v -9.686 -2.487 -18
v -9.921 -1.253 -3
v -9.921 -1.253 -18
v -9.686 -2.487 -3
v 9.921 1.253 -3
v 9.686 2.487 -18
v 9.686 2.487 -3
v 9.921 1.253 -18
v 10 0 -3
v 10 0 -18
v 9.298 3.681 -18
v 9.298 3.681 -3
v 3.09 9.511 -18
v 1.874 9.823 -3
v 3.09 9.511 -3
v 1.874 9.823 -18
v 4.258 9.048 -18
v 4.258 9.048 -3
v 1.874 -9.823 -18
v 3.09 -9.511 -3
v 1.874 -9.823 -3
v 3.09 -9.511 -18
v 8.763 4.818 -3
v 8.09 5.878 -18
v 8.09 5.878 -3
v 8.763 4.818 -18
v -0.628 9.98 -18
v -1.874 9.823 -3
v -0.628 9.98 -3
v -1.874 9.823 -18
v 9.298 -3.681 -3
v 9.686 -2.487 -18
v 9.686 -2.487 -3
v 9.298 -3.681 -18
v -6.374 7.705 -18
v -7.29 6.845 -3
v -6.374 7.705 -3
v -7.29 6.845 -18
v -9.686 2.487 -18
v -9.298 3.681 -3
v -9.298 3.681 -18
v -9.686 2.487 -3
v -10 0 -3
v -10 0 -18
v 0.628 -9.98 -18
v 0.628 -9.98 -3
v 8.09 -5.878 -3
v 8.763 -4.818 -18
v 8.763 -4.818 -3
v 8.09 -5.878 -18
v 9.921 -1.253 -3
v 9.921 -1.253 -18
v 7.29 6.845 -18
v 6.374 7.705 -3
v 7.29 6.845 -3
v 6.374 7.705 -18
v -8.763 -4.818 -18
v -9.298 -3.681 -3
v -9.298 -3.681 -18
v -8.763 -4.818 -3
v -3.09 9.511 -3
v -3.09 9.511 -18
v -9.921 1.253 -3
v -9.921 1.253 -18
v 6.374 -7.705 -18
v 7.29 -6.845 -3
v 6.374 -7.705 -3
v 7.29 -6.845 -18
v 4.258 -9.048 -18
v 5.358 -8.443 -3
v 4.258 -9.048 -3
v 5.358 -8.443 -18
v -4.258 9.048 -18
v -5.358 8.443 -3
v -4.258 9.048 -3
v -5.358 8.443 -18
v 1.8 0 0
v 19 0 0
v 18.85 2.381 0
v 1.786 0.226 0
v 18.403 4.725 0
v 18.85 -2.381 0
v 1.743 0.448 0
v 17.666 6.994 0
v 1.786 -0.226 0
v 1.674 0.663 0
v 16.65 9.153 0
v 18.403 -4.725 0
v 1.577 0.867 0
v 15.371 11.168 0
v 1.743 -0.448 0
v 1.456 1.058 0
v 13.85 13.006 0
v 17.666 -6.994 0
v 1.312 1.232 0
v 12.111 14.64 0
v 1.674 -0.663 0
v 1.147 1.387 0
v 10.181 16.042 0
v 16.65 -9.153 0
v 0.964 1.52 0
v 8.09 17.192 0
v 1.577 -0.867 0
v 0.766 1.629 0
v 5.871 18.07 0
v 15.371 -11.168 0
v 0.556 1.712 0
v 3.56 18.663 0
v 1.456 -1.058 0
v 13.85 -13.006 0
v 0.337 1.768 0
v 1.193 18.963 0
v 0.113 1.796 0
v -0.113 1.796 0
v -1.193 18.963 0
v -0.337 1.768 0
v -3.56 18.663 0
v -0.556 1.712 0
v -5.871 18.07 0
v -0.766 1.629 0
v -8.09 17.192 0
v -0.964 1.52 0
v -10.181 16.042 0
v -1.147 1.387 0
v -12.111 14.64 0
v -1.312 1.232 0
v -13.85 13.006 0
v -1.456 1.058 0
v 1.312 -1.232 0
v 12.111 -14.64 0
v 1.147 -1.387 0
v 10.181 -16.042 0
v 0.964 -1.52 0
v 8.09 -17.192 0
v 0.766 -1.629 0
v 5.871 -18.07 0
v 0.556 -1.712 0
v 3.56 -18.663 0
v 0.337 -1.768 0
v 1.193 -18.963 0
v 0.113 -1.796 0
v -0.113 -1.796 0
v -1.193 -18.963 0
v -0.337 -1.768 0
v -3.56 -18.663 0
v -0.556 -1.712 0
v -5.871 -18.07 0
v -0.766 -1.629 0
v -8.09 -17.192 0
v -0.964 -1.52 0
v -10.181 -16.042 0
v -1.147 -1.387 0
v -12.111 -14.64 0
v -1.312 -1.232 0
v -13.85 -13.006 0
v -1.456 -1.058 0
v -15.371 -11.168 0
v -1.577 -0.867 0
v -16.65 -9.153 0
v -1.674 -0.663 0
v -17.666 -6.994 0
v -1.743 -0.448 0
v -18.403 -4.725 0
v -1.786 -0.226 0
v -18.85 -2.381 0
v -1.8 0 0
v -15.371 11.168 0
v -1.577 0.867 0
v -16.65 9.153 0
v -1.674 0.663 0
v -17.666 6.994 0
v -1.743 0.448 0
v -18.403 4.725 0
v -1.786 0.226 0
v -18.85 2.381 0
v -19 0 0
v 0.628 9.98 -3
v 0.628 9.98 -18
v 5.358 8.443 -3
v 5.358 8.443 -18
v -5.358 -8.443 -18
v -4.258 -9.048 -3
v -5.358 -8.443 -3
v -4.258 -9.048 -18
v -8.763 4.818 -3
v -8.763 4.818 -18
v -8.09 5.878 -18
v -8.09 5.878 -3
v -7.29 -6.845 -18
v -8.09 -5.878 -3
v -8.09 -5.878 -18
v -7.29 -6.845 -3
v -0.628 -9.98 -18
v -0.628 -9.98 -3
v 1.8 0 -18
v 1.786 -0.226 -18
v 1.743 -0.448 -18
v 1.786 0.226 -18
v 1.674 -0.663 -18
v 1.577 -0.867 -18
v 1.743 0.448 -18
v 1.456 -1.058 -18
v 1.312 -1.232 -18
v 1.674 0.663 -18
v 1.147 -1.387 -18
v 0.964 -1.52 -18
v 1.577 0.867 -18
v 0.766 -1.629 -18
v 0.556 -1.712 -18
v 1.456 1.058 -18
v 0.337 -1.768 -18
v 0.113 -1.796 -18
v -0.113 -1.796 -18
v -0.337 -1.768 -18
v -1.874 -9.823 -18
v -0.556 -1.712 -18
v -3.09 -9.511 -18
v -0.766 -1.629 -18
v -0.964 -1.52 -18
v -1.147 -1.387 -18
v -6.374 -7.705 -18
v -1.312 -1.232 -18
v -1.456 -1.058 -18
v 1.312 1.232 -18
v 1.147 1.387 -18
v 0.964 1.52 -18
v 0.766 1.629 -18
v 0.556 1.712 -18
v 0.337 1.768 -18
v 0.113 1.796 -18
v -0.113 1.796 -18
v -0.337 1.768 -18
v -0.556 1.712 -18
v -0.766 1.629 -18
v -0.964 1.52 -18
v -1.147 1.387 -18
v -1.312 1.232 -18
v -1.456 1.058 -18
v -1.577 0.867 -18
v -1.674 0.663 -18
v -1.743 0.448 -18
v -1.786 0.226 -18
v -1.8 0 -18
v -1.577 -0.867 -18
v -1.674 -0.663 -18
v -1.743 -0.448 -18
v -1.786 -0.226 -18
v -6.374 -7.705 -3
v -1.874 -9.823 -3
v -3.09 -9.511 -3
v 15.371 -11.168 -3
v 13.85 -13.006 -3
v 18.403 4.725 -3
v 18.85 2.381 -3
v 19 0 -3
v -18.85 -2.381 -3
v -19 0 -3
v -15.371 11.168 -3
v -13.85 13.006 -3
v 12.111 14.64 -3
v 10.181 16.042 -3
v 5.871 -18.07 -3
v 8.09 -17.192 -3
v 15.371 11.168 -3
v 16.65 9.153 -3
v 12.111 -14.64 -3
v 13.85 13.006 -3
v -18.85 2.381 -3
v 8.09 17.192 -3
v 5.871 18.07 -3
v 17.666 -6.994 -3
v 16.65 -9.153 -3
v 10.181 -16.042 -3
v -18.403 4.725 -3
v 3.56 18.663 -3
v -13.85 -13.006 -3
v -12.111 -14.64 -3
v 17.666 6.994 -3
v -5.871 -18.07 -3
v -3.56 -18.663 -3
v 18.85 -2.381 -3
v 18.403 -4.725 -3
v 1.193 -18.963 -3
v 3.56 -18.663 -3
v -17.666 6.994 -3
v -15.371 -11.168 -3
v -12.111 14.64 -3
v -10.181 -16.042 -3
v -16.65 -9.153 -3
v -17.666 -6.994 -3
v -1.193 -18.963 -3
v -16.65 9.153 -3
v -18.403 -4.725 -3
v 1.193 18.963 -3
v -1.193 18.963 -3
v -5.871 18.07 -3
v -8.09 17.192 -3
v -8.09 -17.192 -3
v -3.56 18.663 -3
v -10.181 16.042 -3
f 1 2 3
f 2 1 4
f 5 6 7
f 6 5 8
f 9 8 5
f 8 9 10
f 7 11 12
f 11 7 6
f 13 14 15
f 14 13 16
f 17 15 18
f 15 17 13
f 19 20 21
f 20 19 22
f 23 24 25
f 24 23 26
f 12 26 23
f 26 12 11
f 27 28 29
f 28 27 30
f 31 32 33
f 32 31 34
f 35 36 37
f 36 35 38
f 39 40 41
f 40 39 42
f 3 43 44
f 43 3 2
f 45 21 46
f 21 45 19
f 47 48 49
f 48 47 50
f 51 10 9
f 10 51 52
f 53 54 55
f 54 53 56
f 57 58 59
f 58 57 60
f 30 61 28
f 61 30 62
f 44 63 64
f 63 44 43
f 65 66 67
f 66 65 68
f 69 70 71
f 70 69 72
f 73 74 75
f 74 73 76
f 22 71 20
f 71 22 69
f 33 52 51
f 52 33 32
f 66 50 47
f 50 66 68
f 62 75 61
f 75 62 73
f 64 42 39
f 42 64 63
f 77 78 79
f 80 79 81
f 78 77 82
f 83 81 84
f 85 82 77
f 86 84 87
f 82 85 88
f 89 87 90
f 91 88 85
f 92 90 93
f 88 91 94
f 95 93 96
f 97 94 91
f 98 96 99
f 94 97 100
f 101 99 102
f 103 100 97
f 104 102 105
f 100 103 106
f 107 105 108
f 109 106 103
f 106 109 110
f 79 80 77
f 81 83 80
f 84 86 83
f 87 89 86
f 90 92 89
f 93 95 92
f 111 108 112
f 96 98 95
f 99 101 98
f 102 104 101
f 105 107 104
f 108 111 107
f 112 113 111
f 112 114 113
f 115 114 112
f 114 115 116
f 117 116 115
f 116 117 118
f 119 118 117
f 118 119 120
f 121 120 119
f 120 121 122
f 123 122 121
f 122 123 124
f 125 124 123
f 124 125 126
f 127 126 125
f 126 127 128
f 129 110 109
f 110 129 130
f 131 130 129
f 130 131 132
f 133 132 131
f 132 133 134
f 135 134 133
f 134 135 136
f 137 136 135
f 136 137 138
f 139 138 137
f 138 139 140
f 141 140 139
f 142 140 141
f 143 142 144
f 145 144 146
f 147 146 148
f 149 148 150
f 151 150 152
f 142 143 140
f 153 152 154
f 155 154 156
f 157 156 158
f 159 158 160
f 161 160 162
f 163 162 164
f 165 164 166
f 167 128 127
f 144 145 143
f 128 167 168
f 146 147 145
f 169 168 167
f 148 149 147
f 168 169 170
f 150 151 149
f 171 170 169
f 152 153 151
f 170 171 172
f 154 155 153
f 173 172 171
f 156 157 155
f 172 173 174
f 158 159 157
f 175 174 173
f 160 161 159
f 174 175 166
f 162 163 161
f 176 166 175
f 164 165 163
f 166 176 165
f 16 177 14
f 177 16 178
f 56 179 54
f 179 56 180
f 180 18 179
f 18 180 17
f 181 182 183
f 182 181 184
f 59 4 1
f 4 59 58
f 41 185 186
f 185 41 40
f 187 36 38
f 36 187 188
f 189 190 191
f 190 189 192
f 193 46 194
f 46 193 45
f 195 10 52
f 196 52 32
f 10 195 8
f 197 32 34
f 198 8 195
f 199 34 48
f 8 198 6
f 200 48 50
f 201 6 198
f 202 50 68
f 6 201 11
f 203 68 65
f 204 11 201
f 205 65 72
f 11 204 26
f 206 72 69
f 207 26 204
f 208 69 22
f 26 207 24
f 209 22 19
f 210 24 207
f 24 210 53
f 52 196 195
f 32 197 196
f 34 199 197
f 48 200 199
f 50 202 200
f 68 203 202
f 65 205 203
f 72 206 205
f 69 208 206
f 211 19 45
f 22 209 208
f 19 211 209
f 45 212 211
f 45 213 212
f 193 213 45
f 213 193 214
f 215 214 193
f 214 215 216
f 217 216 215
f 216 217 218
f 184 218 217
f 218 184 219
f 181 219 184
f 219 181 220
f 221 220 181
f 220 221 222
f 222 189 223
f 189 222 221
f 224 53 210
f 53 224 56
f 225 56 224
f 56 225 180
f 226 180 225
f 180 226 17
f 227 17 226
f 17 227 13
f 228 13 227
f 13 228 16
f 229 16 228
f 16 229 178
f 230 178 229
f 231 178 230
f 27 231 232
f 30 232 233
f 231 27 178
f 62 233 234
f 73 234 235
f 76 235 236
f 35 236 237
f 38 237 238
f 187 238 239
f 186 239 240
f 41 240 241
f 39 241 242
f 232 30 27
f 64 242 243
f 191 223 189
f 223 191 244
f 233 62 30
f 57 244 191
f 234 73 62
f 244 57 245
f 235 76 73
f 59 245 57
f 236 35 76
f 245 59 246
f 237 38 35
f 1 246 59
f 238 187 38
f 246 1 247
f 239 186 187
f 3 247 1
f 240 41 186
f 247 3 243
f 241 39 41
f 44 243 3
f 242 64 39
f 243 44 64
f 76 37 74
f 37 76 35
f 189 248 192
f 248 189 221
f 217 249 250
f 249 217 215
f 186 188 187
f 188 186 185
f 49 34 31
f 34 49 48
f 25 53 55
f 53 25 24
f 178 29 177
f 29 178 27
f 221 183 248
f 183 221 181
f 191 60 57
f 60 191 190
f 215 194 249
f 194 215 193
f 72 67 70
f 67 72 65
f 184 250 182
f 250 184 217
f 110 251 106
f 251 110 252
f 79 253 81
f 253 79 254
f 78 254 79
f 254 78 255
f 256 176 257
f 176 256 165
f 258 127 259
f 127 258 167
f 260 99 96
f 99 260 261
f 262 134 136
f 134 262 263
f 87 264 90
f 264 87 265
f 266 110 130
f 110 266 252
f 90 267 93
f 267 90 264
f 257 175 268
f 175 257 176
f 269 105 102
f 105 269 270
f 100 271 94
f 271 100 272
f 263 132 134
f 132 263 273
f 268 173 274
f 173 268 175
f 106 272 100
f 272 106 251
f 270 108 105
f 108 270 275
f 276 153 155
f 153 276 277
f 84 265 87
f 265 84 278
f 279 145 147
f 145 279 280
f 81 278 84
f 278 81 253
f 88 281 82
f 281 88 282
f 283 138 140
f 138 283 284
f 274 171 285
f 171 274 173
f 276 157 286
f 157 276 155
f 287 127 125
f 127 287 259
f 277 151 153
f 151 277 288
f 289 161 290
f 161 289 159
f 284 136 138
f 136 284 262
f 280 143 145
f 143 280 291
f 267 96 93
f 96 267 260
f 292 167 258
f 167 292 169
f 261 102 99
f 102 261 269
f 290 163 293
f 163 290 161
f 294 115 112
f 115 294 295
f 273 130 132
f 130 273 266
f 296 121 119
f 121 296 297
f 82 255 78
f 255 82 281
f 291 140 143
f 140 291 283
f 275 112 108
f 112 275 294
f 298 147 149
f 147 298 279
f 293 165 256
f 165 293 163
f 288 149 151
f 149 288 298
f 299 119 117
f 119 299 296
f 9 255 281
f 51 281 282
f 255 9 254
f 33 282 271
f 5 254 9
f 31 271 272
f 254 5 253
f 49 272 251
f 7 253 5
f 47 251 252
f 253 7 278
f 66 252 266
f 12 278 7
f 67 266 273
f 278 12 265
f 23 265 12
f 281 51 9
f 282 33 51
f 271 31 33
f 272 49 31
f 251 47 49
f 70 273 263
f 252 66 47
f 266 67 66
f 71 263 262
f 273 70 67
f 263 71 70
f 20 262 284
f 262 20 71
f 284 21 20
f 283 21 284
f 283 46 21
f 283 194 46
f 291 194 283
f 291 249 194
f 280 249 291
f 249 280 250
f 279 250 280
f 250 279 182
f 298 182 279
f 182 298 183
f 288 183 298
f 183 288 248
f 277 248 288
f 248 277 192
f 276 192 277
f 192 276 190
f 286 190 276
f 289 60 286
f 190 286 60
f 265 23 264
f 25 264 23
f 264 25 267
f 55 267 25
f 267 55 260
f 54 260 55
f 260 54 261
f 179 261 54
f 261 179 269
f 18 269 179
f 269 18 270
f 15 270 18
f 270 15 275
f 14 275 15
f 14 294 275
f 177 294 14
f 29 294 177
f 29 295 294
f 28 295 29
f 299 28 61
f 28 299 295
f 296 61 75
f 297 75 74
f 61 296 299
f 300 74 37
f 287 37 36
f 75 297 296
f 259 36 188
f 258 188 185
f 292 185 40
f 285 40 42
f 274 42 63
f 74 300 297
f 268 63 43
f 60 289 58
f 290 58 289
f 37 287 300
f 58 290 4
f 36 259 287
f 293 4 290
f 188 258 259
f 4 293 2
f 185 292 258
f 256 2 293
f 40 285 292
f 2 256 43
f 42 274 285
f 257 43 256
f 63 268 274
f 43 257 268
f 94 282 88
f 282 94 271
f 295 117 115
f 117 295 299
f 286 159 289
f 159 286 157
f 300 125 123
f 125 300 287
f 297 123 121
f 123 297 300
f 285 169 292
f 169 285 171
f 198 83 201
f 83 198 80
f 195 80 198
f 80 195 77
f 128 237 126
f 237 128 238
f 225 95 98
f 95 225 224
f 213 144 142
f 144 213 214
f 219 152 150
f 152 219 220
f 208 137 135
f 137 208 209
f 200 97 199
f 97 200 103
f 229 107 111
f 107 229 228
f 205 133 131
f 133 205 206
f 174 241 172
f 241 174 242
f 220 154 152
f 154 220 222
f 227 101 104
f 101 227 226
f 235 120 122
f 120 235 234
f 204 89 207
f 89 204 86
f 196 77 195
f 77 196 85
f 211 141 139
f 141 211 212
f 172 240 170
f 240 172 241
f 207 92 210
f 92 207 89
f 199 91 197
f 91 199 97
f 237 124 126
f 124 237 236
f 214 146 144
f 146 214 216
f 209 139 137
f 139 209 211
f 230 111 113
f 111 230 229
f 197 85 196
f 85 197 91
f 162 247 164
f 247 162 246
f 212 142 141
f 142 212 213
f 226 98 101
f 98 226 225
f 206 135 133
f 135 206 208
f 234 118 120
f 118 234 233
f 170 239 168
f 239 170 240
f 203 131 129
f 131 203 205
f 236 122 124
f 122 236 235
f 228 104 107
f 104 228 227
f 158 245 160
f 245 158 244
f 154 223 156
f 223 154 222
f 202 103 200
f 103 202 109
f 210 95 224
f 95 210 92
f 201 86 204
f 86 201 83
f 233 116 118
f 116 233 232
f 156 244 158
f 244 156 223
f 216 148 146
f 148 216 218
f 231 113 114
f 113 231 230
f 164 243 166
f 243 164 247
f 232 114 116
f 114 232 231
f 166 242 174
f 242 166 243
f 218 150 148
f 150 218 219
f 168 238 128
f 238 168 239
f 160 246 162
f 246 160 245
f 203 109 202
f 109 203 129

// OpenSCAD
$fn = 50;


difference() {
	union() {
		translate(v = [0, 0, -18.0000000000]) {
			cylinder(h = 18, r = 10.0000000000);
		}
		translate(v = [0, 0, -3.0000000000]) {
			cylinder(h = 3, r = 19.0000000000);
		}
	}
	union() {
		#translate(v = [0, 0, -18]) {
			cylinder(h = 18, r = 1.8000000000);
		}
	}
}
